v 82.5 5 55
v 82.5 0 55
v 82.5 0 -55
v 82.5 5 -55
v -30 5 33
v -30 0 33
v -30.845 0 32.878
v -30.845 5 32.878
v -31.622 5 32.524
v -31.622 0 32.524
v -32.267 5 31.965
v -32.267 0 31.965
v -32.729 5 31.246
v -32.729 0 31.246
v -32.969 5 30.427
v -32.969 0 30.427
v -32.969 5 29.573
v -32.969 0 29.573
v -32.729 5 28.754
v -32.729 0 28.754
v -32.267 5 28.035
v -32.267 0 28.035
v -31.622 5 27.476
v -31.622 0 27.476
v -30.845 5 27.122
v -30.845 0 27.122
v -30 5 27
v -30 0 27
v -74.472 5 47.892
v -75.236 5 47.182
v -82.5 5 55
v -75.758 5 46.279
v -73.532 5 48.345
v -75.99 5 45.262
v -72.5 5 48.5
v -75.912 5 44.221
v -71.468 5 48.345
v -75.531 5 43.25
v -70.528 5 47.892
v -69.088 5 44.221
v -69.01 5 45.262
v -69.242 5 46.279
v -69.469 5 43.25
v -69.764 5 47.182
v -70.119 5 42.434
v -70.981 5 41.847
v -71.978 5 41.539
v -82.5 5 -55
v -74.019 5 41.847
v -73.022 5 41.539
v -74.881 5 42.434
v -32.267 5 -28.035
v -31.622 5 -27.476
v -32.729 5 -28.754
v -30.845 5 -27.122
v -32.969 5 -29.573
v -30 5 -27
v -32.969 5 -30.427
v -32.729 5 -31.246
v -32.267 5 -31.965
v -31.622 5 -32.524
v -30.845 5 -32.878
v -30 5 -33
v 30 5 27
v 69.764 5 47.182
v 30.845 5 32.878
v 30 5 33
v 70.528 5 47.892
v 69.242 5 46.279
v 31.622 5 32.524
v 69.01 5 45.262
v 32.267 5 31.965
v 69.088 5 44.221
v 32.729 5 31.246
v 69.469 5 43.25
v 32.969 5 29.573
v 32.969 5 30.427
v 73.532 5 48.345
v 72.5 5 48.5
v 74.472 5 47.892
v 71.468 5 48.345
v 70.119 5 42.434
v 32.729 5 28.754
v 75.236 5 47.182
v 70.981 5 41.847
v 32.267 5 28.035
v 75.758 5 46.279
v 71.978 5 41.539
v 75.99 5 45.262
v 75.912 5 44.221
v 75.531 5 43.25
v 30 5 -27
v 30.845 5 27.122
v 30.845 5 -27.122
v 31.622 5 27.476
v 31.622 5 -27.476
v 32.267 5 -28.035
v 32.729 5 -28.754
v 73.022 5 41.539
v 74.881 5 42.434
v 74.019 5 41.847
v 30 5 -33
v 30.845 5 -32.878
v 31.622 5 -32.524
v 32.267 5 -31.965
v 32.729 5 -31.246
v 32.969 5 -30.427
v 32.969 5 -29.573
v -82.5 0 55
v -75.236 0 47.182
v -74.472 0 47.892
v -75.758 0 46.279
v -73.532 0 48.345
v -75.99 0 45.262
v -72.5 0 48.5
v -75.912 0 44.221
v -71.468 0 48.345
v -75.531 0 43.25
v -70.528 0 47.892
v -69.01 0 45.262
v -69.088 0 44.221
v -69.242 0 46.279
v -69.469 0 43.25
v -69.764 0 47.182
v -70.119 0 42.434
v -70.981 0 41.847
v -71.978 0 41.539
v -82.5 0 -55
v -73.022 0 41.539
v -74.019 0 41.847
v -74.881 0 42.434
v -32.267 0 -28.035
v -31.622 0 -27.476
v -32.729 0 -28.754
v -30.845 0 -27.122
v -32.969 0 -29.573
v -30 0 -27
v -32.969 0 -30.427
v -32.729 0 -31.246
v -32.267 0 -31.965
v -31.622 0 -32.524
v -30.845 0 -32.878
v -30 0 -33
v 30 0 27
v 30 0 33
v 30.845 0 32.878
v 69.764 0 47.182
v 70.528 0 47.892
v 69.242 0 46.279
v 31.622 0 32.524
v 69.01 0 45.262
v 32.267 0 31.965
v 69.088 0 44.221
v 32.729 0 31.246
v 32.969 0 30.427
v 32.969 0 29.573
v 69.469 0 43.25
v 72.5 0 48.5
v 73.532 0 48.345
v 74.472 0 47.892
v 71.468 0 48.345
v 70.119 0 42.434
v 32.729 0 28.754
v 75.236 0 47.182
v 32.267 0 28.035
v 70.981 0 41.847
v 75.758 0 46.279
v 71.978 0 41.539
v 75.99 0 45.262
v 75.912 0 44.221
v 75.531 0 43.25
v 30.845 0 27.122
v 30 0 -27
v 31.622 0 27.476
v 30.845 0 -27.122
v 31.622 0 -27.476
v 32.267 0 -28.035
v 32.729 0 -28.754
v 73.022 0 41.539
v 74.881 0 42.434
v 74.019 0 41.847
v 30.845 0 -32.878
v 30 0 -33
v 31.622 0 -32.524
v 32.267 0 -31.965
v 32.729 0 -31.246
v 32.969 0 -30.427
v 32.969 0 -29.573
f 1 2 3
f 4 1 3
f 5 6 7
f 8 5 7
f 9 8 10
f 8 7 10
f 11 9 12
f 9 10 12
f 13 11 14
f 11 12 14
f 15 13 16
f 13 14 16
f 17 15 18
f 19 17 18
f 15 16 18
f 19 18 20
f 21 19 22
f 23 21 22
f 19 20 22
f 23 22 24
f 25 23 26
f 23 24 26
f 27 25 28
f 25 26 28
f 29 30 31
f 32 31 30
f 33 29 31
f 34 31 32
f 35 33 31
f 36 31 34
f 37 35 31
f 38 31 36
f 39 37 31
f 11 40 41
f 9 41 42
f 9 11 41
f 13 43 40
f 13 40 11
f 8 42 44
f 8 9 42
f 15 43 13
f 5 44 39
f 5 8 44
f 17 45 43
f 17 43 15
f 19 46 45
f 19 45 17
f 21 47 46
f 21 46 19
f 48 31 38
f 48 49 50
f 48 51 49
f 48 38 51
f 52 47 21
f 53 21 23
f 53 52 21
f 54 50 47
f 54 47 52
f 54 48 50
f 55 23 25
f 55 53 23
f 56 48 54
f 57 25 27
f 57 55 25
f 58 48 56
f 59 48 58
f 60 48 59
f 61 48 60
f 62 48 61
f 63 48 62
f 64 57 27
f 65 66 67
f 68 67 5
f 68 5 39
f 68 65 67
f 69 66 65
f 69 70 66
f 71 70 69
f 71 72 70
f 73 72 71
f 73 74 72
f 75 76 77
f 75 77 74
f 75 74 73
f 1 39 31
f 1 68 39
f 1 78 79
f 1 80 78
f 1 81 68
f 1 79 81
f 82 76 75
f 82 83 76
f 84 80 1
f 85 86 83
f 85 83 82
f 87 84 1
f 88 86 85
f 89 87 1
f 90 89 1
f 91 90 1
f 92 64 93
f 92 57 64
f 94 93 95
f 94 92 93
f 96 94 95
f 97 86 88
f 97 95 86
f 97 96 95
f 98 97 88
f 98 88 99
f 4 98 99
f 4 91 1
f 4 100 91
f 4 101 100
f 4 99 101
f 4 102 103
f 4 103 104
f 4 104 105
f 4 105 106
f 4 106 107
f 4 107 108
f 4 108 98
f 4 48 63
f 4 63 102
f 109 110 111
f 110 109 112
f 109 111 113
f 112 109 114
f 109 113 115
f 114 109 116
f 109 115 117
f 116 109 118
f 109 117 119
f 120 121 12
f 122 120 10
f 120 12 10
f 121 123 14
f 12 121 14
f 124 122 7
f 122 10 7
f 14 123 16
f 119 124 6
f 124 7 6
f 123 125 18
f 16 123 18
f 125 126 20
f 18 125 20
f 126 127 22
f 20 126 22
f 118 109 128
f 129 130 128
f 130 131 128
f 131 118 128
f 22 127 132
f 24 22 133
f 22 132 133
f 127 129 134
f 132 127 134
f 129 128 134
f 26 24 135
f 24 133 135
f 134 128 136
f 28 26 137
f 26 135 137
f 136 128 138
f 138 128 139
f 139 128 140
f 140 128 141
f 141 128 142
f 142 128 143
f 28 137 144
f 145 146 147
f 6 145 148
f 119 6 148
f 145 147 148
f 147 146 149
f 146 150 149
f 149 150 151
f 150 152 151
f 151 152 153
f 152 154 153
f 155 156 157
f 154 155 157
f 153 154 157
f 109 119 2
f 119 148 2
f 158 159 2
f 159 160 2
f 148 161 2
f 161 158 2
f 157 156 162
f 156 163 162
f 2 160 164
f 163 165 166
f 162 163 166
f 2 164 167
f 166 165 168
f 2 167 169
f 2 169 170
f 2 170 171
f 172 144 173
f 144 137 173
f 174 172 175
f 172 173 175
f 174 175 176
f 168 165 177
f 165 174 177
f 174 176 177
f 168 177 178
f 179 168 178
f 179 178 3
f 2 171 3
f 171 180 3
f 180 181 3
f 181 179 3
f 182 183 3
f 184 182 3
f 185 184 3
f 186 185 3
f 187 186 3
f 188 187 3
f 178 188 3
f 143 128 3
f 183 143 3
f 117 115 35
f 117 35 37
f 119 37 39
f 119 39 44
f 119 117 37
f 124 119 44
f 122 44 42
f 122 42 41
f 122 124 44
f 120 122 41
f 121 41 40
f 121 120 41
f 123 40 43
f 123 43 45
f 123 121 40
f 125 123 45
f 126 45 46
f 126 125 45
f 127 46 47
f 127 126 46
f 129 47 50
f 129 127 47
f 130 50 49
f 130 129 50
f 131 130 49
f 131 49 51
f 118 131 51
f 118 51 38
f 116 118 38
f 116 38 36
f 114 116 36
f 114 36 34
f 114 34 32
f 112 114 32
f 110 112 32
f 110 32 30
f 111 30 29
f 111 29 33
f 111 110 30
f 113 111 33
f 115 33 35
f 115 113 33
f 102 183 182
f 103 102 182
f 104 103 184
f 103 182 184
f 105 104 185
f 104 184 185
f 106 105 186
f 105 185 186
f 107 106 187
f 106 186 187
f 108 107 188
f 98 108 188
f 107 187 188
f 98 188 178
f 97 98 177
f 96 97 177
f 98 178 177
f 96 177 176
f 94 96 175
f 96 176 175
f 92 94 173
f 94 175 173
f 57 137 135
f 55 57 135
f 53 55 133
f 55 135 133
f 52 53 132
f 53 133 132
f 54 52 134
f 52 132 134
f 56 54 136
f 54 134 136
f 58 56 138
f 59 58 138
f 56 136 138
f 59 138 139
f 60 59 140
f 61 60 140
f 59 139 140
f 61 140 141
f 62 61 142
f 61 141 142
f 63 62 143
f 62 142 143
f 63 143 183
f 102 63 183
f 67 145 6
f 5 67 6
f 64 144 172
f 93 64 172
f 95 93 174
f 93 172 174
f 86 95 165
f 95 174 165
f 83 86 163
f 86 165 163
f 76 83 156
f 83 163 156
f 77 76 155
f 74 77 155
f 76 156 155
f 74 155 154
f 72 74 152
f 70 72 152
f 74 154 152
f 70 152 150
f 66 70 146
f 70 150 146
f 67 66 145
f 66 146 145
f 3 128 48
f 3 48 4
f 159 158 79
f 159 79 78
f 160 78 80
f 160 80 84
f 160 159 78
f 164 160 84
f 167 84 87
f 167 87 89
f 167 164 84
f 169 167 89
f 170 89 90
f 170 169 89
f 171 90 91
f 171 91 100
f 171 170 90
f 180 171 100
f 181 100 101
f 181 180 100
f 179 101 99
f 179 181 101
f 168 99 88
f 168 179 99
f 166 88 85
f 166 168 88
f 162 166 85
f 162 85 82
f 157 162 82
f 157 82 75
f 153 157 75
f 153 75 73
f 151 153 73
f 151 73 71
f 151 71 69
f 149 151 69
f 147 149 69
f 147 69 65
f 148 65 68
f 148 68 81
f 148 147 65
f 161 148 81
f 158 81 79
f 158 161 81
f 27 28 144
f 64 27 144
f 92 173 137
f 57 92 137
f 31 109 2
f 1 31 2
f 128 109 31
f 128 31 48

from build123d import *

# Parameters (mm, degrees)
SKETCH1_W           = 165
SKETCH1_H           = 110
SKETCH1_R           = 3.5
BOSS_EXTRUDE1_DEPTH = 5


with BuildPart() as part:
    # Sketch1 → Boss-Extrude1 (new body)
    with BuildSketch(Plane(origin=(0, 0, 0), x_dir=(1, 0, 0), z_dir=(0, 1, 0))):
        Rectangle(SKETCH1_W, SKETCH1_H)
        with Locations(Location((72.5, -45, 0), (0, 0, 270))):
            Circle(SKETCH1_R, mode=Mode.SUBTRACT)
        with Locations(Location((-72.5, -45, 0), (0, 0, 270))):
            Circle(SKETCH1_R, mode=Mode.SUBTRACT)
        with BuildLine():
            Line((30, -33), (-30, -33))
            ThreePointArc((-30, -33), (-33, -30), (-30, -27))
            Line((-30, -27), (30, -27))
            ThreePointArc((30, -27), (33, -30), (30, -33))
        make_face(mode=Mode.SUBTRACT)
        with BuildLine():
            Line((30, 27), (-30, 27))
            ThreePointArc((-30, 27), (-33, 30), (-30, 33))
            Line((-30, 33), (30, 33))
            ThreePointArc((30, 33), (33, 30), (30, 27))
        make_face(mode=Mode.SUBTRACT)
    extrude(amount=BOSS_EXTRUDE1_DEPTH)


solid = part.part
